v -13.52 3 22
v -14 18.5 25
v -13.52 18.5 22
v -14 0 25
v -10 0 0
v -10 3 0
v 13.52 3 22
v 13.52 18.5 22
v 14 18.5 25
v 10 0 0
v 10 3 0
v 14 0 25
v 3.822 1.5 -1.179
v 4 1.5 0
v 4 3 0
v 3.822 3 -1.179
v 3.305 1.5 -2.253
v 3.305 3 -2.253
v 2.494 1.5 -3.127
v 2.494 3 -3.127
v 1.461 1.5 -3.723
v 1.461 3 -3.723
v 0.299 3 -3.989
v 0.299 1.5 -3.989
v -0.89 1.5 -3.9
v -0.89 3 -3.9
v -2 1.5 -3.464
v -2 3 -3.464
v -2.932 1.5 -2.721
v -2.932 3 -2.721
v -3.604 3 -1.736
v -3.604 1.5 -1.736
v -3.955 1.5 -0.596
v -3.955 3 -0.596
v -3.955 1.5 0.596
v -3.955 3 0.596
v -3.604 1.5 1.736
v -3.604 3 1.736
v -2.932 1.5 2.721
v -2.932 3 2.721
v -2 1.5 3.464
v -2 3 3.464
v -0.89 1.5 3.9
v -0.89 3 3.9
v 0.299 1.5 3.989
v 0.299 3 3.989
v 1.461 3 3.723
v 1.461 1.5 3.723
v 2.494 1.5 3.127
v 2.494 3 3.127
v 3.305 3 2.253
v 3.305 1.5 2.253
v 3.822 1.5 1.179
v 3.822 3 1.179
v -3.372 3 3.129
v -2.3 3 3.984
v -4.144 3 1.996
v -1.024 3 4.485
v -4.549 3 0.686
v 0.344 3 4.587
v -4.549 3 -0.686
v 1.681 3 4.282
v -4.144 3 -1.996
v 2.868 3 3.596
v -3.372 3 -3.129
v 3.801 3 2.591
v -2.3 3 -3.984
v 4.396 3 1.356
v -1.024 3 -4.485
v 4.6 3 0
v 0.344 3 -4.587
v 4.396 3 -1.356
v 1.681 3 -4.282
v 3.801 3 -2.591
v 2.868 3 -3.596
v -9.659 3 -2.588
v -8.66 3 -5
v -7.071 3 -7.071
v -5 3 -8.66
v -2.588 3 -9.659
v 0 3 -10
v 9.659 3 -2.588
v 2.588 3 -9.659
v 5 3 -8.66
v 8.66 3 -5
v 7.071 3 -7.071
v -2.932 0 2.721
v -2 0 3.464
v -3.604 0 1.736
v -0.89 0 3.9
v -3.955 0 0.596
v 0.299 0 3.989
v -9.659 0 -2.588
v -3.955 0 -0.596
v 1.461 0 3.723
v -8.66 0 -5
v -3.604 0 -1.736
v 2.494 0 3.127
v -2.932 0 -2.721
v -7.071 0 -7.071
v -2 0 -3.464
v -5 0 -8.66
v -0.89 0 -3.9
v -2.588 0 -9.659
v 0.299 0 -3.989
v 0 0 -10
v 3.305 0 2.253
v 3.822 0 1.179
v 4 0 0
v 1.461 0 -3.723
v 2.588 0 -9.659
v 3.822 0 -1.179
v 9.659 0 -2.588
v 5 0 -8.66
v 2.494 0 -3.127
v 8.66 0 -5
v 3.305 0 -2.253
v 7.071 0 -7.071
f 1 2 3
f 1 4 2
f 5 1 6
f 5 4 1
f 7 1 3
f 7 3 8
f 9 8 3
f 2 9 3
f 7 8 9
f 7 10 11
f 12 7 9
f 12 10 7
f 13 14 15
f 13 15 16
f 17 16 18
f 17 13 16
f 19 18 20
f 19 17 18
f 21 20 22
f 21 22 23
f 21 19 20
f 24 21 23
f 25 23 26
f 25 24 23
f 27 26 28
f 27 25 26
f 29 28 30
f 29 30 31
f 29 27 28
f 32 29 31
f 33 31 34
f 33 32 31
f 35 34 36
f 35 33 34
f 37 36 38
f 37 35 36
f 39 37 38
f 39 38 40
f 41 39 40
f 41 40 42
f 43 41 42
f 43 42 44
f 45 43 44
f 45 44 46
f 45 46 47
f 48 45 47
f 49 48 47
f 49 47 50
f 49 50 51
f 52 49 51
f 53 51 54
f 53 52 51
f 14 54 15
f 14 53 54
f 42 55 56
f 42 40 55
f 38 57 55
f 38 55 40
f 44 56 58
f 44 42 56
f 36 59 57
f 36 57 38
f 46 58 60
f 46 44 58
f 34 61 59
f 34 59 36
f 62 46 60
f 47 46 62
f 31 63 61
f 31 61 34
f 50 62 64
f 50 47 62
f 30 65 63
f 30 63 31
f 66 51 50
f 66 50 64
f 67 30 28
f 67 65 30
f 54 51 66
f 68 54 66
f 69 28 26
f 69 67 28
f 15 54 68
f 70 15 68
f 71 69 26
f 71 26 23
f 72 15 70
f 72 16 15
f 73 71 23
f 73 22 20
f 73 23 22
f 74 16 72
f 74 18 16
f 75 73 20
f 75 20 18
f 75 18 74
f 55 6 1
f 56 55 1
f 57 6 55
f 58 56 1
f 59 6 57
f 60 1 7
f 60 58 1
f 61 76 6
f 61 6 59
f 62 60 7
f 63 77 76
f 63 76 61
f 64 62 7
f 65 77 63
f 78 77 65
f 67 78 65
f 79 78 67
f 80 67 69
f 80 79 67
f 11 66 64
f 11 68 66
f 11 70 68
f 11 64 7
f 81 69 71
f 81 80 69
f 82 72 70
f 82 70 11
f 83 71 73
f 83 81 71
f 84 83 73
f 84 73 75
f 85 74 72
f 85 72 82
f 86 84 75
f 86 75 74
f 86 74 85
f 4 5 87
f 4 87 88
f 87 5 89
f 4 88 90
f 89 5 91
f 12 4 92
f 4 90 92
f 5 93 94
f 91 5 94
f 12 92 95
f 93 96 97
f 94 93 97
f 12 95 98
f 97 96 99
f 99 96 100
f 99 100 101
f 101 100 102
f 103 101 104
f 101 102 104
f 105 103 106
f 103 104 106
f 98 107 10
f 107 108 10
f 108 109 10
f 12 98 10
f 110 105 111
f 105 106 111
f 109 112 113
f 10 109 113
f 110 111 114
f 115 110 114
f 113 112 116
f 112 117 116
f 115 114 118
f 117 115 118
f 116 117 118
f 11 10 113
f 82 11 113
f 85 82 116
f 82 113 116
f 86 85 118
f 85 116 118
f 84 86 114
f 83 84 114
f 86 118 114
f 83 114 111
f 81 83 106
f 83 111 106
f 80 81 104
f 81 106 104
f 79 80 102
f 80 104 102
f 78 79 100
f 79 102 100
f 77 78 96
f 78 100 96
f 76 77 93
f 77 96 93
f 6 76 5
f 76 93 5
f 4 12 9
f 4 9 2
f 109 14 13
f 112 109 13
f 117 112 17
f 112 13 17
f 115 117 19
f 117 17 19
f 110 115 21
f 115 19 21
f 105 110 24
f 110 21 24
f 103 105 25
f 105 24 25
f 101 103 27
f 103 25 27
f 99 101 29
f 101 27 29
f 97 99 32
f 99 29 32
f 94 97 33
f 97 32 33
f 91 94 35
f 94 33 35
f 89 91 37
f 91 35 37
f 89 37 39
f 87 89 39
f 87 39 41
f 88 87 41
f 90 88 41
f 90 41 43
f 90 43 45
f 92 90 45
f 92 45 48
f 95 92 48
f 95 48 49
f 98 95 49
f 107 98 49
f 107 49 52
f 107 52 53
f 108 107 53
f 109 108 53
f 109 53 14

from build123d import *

# Parameters (mm, degrees)
BOSS_EXTRUDE1_DEPTH = 3
SKETCH2_R           = 4
CUT_EXTRUDE1_DEPTH  = 13
BOSS_EXTRUDE2_DEPTH = 15.5
SKETCH6_R           = 4.6
CUT_EXTRUDE4_DEPTH  = 1.5
SKETCH7_R           = 4.6
SKETCH7_R_2         = 4
BOSS_EXTRUDE3_DEPTH = 1.5


with BuildPart() as part:
    # Sketch1 → Boss-Extrude1 (new body)
    with BuildSketch(Plane(origin=(0, 0, 0), x_dir=(1, 0, 0), z_dir=(0, 1, 0))):
        with BuildLine():
            Line((-10, 0), (-14, -25))
            Line((-14, -25), (14, -25))
            Line((14, -25), (10, 0))
            ThreePointArc((10, 0), (0, 10), (-10, 0))
        make_face()
    extrude(amount=BOSS_EXTRUDE1_DEPTH)

    # Sketch2 → Cut-Extrude1 (cut)
    with BuildSketch(Plane(origin=(0, 3, 0), x_dir=(1, 0, 0), z_dir=(0, 1, 0))):
        Circle(SKETCH2_R)
    extrude(amount=-CUT_EXTRUDE1_DEPTH, mode=Mode.SUBTRACT)

    # Sketch5 → Boss-Extrude2 (add)
    with BuildSketch(Plane(origin=(0, 3, 0), x_dir=(1, 0, 0), z_dir=(0, 1, 0))):
        Polygon((-13.52, -22), (13.52, -22), (14, -25), (-14, -25), align=None)
    extrude(amount=BOSS_EXTRUDE2_DEPTH)

    # Sketch6 → Cut-Extrude4 (cut)
    with BuildSketch(Plane(origin=(0, 3, 0), x_dir=(1, 0, 0), z_dir=(0, 1, 0))):
        Circle(SKETCH6_R)
    extrude(amount=-CUT_EXTRUDE4_DEPTH, mode=Mode.SUBTRACT)

    # Sketch7 → Boss-Extrude3 (add)
    with BuildSketch(Plane(origin=(0, 1.5, 0), x_dir=(1, 0, 0), z_dir=(0, 1, 0))):
        Circle(SKETCH7_R)
        Circle(SKETCH7_R_2, mode=Mode.SUBTRACT)
    extrude(amount=BOSS_EXTRUDE3_DEPTH)


solid = part.part
